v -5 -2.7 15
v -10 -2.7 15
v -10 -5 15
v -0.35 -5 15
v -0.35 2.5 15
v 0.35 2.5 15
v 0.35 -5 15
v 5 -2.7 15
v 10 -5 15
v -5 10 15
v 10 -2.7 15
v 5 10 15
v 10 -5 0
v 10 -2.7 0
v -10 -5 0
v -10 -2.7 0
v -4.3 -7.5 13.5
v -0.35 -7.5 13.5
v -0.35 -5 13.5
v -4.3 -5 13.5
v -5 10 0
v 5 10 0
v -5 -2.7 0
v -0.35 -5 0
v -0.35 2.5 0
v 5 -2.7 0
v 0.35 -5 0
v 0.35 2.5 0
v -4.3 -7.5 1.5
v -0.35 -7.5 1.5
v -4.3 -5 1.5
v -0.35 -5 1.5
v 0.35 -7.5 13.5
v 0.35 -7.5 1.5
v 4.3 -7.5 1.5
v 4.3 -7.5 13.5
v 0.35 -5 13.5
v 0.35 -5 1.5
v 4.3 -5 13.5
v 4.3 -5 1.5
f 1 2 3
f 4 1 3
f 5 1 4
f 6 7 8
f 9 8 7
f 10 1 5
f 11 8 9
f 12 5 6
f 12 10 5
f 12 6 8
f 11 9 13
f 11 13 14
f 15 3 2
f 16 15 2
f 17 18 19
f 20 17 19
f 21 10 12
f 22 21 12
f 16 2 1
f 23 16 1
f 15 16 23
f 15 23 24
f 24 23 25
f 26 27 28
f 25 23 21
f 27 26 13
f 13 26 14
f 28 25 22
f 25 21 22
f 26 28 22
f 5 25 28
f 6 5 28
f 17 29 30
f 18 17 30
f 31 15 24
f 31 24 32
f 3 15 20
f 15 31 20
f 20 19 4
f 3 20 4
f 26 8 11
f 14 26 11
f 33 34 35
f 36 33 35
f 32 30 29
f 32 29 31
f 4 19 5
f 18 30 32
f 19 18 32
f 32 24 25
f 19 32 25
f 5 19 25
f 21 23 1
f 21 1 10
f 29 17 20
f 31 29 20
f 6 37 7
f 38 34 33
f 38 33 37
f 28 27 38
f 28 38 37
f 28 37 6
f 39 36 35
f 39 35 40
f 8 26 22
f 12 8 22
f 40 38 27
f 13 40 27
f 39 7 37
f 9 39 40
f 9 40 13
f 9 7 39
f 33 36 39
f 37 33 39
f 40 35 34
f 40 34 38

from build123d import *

# Parameters (mm, degrees)
SKETCH1_W               = 10
SKETCH1_H               = 15
BOSS_EXTRUDE1_DEPTH     = 15
CUT_EXTRUDE1_DEPTH      = 18.5
CUT_EXTRUDE1_DEPTH_BACK = 18.5
SKETCH2_W               = 0.7
SKETCH2_H               = 10
SKETCH3_W               = 5
SKETCH3_H               = 2.3
SKETCH3_W_2             = 10
SKETCH3_H_2             = 2.5
BOSS_EXTRUDE2_DEPTH     = 15
CUT_EXTRUDE2_DEPTH      = 24.452078799
CUT_EXTRUDE2_DEPTH_BACK = 24.452078799
SKETCH4_W               = 1.5
SKETCH4_H               = 2.5
CUT_EXTRUDE3_DEPTH      = 21.615528128
CUT_EXTRUDE3_DEPTH_BACK = 21.615528128
SKETCH5_W               = 0.7
SKETCH5_H               = 2.5


with BuildPart() as part:
    # Sketch1 → Boss-Extrude1 (new body)
    with BuildSketch(Plane.XY):
        Rectangle(SKETCH1_W, SKETCH1_H)
    extrude(amount=BOSS_EXTRUDE1_DEPTH)

    # Sketch2 → Cut-Extrude1 (cut, two sides: drawn at the far end of the back side and taken through both)
    with BuildSketch(Plane.XY.offset(15).offset(-CUT_EXTRUDE1_DEPTH_BACK)):
        with Locations((0, -2.5)):
            Rectangle(SKETCH2_W, SKETCH2_H)
    extrude(amount=CUT_EXTRUDE1_DEPTH + CUT_EXTRUDE1_DEPTH_BACK, mode=Mode.SUBTRACT)

    # Sketch3 → Boss-Extrude2 (add)
    with BuildSketch(Plane.XY.offset(15)):
        with Locations((-7.5, -3.85)):
            Rectangle(SKETCH3_W, SKETCH3_H)
        with Locations((7.5, -3.85)):
            Rectangle(SKETCH3_W, SKETCH3_H)
        with Locations((0, 8.75)):
            Rectangle(SKETCH3_W_2, SKETCH3_H_2)
    extrude(amount=-BOSS_EXTRUDE2_DEPTH)

    # Sketch4 → Cut-Extrude2 (cut, two sides: drawn at the far end of the back side and taken through both)
    with BuildSketch(Plane.ZY.offset(5).offset(-CUT_EXTRUDE2_DEPTH_BACK)):
        with Locations((0.75, -6.25)):
            Rectangle(SKETCH4_W, SKETCH4_H)
        with Locations((14.25, -6.25)):
            Rectangle(SKETCH4_W, SKETCH4_H)
    extrude(amount=CUT_EXTRUDE2_DEPTH + CUT_EXTRUDE2_DEPTH_BACK, mode=Mode.SUBTRACT)

    # Sketch5 → Cut-Extrude3 (cut, two sides: drawn at the far end of the back side and taken through both)
    with BuildSketch(Plane(origin=(0, 0, 0), x_dir=(-1, 0, 0), z_dir=(0, 0, -1)).offset(-CUT_EXTRUDE3_DEPTH_BACK)):
        with Locations((4.65, -6.25)):
            Rectangle(SKETCH5_W, SKETCH5_H)
        with Locations((-4.65, -6.25)):
            Rectangle(SKETCH5_W, SKETCH5_H)
    extrude(amount=CUT_EXTRUDE3_DEPTH + CUT_EXTRUDE3_DEPTH_BACK, mode=Mode.SUBTRACT)


solid = part.part
